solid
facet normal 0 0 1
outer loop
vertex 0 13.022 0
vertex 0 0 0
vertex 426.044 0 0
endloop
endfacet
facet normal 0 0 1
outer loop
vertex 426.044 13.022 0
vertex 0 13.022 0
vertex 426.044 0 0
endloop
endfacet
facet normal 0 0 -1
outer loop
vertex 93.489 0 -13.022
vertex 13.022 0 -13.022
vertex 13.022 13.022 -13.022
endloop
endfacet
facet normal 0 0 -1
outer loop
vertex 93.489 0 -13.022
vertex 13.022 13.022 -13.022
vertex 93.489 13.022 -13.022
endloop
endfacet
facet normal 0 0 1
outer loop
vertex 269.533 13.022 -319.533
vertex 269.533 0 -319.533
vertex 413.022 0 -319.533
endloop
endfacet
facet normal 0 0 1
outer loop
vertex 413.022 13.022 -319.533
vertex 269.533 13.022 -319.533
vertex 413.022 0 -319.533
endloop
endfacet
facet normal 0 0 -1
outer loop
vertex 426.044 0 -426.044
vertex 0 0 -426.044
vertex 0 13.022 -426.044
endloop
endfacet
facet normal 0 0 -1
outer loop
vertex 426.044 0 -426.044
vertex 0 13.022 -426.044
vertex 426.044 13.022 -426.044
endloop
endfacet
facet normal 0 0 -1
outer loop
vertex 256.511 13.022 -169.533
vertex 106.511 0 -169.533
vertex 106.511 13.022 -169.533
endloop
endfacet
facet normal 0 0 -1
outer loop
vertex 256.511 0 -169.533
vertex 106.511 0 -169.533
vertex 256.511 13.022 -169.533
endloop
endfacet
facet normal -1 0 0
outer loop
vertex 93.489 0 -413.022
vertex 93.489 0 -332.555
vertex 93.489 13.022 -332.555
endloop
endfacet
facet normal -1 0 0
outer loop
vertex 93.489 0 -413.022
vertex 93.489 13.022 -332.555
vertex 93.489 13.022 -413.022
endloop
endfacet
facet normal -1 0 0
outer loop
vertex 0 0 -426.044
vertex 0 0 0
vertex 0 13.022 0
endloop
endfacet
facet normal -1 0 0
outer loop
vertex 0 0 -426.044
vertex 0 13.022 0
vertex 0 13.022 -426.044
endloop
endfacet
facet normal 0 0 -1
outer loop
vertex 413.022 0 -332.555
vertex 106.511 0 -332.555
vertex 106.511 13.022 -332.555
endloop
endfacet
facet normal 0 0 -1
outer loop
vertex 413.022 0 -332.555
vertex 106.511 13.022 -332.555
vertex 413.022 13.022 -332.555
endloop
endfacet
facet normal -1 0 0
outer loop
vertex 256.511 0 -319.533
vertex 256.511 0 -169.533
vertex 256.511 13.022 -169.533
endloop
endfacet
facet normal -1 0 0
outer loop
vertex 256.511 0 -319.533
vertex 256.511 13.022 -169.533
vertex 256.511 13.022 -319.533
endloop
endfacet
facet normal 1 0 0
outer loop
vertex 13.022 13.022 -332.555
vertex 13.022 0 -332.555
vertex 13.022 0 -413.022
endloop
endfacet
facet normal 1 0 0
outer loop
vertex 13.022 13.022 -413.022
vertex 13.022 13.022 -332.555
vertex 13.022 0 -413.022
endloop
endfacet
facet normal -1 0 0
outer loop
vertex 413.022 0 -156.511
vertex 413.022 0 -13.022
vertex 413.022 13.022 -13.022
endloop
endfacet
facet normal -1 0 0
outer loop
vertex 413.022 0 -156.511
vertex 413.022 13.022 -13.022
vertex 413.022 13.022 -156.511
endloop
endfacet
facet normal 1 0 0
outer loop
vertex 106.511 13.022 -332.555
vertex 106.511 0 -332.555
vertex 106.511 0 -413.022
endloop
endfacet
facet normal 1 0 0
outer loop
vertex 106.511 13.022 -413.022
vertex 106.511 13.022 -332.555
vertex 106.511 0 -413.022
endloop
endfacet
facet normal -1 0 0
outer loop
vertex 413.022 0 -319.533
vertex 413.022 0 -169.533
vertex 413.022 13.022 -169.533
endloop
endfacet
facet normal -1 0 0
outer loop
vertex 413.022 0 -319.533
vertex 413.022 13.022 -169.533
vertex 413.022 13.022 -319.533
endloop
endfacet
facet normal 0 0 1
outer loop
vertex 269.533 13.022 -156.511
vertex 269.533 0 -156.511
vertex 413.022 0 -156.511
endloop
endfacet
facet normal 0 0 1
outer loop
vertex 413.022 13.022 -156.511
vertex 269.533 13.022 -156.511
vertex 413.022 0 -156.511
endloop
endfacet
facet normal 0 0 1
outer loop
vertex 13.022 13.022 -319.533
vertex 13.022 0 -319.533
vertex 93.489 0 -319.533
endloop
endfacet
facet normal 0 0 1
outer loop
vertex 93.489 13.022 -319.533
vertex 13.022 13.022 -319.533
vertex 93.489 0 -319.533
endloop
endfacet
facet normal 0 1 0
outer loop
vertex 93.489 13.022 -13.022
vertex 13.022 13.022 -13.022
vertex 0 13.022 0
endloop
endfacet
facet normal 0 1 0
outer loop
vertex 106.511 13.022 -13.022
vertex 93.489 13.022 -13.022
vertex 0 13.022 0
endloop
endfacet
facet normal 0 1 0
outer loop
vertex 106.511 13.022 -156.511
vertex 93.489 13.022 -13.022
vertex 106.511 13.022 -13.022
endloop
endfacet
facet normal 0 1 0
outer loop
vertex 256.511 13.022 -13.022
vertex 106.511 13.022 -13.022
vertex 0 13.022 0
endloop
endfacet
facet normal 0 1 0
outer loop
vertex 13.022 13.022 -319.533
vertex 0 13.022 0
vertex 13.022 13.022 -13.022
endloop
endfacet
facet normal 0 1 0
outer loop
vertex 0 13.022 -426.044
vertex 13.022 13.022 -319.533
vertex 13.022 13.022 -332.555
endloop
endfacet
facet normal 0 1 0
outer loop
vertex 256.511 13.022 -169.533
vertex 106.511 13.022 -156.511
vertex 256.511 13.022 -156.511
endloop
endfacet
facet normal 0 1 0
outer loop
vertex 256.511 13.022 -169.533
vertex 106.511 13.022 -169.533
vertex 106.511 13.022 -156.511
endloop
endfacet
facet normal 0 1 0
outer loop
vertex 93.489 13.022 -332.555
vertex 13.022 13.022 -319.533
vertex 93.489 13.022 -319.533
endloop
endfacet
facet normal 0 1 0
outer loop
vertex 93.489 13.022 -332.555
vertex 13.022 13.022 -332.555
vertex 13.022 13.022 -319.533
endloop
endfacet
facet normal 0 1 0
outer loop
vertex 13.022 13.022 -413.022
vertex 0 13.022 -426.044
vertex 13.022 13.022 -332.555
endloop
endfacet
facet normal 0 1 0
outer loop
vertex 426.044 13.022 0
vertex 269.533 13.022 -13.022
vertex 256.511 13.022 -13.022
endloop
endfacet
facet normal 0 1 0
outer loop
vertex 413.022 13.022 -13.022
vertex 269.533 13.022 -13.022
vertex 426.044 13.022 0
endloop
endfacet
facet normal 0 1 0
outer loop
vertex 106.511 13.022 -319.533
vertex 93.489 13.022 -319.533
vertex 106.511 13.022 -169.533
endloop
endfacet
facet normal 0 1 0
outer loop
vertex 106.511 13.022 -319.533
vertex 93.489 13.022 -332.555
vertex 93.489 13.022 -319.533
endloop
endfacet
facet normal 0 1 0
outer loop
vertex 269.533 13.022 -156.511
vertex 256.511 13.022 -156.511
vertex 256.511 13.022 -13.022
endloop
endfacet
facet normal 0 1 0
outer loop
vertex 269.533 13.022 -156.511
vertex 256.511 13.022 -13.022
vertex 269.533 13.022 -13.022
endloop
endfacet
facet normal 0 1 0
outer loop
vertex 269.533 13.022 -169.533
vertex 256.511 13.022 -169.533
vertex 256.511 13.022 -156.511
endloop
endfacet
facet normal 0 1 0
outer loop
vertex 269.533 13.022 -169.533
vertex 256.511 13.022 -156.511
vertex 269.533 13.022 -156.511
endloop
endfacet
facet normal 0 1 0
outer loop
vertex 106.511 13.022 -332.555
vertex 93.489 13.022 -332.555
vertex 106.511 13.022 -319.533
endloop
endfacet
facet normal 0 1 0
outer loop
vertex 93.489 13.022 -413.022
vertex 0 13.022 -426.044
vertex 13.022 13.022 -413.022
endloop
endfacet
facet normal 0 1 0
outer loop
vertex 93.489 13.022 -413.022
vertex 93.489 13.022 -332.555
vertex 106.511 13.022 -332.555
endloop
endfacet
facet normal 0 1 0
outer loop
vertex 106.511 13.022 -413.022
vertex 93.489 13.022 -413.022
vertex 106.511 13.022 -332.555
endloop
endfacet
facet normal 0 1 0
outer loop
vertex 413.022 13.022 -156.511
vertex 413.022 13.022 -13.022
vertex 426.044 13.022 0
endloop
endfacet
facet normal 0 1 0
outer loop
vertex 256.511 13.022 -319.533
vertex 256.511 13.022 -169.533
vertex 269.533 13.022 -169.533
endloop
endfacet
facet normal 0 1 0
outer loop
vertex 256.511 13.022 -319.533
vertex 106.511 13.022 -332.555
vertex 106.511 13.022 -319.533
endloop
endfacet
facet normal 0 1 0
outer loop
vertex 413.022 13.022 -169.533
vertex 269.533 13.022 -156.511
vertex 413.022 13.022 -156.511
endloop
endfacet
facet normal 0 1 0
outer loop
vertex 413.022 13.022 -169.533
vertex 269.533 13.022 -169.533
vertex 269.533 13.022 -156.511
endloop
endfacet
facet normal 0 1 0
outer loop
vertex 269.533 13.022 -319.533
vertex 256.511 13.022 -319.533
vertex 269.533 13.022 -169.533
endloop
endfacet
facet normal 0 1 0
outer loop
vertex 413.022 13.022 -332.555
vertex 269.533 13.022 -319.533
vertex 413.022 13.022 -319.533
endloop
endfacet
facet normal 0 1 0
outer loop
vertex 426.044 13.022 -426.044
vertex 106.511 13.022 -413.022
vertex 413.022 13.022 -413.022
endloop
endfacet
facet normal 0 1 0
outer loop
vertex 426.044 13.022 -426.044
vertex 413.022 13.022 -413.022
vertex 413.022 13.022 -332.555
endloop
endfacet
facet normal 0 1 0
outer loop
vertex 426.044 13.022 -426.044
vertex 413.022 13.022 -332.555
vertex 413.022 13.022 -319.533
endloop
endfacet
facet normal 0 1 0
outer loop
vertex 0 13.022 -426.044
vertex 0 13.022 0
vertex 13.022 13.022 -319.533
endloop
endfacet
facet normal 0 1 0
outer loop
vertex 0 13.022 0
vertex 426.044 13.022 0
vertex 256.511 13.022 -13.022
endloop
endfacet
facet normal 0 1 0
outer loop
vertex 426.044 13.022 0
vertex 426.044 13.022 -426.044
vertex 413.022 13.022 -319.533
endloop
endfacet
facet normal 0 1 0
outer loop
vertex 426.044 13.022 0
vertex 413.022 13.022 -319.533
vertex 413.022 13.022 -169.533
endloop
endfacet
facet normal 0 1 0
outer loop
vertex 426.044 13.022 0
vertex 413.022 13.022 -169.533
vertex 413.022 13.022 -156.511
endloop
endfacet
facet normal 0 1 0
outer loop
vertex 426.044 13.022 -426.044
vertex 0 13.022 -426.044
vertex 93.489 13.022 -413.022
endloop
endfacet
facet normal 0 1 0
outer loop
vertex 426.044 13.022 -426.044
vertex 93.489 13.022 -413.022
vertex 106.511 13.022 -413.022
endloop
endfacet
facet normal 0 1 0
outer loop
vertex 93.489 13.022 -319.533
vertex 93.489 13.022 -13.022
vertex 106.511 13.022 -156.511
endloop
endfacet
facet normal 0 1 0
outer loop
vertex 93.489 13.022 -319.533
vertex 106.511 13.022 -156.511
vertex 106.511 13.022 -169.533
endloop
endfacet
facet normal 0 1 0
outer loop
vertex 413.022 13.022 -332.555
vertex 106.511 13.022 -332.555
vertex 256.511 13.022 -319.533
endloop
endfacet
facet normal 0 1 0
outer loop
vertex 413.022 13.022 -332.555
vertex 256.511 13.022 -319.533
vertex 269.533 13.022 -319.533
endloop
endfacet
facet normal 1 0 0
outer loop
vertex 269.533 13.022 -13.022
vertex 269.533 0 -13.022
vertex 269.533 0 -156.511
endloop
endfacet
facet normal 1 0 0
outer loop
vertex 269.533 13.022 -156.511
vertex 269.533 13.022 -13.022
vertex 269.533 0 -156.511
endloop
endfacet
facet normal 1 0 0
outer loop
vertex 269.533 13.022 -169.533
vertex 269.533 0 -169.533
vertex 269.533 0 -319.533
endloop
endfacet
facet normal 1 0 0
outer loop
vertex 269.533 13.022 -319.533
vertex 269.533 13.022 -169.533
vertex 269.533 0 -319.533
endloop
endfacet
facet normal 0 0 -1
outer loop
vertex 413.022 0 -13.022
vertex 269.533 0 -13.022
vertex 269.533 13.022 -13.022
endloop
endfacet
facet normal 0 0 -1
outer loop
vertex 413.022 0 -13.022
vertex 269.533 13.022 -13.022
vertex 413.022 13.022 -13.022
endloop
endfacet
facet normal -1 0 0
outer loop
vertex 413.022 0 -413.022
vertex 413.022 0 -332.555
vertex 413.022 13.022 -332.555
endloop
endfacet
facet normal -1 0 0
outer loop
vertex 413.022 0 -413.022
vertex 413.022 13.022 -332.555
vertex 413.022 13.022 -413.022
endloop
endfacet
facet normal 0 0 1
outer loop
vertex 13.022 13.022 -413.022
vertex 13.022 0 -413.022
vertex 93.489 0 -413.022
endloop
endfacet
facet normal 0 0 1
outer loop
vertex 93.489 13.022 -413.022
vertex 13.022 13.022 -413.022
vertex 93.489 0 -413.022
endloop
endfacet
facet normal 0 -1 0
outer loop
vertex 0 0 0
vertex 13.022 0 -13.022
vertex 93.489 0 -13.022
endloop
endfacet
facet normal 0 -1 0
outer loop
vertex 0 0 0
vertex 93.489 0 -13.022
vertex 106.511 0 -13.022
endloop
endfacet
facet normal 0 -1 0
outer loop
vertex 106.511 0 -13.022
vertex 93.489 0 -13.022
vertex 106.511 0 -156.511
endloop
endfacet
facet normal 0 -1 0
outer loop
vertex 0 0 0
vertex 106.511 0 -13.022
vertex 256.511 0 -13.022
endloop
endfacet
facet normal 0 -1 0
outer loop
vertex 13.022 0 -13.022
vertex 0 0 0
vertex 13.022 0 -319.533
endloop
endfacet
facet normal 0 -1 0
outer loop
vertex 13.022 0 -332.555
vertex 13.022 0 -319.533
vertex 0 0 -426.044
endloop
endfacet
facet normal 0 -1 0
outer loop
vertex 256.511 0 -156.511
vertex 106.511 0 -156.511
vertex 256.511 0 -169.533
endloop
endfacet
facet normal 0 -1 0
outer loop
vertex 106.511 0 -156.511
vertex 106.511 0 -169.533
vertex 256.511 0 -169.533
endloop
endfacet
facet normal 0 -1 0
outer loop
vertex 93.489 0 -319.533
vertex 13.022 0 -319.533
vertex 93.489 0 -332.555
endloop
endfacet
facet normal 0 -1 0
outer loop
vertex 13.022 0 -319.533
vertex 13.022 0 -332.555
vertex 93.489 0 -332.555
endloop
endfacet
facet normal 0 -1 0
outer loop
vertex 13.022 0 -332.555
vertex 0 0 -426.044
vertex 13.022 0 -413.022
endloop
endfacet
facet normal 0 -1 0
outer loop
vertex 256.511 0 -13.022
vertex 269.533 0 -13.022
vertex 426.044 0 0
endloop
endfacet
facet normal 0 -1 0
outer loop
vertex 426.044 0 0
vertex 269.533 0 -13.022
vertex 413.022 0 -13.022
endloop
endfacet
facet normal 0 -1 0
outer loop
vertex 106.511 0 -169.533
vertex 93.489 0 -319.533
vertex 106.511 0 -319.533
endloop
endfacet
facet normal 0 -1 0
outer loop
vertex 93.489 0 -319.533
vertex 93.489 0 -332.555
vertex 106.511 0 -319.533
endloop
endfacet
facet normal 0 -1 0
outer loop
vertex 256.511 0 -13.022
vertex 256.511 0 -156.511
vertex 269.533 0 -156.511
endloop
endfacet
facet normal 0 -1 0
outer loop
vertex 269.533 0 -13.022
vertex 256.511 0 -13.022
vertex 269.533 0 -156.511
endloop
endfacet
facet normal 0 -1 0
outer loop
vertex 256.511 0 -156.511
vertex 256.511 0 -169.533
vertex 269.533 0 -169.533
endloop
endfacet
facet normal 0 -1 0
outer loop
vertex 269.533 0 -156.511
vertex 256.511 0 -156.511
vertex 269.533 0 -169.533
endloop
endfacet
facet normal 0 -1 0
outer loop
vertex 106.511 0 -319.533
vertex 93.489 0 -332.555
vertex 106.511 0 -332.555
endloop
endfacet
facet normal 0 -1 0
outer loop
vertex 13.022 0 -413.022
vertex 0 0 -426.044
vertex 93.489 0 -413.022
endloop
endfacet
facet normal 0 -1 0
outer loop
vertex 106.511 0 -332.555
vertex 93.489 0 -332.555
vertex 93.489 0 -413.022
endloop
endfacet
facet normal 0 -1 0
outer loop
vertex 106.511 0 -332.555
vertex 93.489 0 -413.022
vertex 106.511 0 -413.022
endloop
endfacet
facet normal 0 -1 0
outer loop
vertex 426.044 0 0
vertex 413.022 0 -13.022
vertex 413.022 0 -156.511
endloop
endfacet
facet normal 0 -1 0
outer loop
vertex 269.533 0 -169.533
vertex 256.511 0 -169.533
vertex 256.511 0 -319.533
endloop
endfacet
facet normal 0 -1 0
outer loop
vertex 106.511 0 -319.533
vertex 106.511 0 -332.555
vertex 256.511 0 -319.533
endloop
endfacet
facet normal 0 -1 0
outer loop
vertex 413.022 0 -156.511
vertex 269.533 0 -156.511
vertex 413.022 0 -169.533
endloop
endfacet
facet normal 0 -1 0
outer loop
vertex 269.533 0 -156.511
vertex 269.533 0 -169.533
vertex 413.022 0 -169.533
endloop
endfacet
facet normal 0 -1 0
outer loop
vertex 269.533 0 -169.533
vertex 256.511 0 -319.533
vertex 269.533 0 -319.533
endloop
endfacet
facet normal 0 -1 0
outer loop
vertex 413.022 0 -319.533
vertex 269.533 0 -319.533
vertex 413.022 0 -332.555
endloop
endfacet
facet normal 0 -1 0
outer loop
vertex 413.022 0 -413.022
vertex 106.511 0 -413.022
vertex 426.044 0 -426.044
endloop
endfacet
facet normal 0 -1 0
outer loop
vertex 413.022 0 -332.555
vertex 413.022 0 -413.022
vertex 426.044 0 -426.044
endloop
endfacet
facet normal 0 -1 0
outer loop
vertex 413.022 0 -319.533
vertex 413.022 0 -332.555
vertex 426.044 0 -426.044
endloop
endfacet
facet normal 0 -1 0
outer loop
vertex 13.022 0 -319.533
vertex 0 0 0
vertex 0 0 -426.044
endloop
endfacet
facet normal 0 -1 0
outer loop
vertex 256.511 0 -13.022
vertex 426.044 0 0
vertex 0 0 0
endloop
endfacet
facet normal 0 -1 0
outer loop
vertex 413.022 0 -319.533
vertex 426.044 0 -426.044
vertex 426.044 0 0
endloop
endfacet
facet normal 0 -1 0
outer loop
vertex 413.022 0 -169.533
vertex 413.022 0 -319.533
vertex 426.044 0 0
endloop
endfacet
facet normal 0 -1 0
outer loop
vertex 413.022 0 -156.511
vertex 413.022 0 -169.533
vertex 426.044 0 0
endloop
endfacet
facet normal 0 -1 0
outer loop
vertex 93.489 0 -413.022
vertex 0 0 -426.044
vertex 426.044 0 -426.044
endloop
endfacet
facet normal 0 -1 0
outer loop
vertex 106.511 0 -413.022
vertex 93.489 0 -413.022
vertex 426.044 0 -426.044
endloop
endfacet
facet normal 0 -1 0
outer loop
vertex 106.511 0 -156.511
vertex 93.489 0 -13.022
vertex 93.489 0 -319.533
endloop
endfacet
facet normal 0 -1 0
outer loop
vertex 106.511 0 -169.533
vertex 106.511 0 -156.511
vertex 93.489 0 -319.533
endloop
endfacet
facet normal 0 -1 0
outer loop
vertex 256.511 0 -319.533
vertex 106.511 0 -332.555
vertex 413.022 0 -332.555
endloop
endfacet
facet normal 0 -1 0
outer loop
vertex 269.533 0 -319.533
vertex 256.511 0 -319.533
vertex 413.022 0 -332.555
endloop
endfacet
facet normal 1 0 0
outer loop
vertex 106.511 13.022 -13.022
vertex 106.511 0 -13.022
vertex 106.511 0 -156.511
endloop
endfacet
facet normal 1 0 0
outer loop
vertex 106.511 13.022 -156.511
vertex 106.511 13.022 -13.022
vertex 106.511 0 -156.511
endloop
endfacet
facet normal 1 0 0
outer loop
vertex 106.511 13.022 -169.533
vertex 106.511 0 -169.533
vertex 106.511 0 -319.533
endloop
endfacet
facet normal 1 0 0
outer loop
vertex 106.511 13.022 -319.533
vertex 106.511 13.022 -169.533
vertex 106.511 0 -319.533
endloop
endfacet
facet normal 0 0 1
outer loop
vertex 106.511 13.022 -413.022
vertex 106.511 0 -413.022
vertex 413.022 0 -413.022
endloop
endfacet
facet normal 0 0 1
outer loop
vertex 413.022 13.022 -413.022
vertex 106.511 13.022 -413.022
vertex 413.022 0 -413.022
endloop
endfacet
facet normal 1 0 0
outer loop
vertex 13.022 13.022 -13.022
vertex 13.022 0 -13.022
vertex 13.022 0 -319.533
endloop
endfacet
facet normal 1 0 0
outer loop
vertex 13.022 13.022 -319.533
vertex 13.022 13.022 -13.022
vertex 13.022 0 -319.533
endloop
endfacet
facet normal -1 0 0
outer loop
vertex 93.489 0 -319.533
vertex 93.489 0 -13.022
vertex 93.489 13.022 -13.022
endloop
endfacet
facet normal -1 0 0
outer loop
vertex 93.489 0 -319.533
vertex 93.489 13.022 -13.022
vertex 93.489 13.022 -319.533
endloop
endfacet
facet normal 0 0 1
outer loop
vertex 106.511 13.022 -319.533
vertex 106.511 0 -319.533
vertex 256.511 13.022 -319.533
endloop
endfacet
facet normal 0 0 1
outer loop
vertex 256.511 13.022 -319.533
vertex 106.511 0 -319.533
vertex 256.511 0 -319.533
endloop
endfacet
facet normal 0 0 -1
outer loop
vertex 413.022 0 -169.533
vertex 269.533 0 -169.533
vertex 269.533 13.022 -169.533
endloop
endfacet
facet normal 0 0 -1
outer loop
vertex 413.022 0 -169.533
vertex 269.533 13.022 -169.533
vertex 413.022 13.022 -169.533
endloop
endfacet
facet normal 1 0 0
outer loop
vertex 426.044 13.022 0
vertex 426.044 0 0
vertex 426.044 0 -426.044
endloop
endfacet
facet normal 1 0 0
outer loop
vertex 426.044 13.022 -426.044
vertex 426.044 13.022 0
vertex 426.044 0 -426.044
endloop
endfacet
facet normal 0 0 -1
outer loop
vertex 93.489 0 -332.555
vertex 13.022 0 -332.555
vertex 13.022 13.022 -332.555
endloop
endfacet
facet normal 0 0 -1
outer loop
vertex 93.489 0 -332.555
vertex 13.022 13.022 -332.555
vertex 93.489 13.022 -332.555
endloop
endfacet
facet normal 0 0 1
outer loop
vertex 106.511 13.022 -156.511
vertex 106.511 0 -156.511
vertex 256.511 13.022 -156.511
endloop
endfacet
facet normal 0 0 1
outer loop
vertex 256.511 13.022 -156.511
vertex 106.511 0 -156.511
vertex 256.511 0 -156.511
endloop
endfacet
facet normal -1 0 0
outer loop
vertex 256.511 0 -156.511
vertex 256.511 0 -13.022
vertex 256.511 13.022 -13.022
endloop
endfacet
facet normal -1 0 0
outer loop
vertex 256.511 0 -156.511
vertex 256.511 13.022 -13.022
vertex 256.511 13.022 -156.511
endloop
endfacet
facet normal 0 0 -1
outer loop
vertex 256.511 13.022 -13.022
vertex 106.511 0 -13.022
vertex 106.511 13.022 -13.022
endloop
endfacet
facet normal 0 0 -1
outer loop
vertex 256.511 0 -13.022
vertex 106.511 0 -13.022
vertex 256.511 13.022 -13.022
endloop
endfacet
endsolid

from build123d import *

# Parameters (mm, degrees)
SKETCH2_W           = 426.044
SKETCH2_H           = 426.044
SKETCH2_W_2         = 80.467
SKETCH2_H_2         = 306.511
SKETCH2_H_3         = 80.467
SKETCH2_W_3         = 143.489
SKETCH2_H_4         = 143.489
SKETCH2_W_4         = 306.511
SKETCH2_W_5         = 150
SKETCH2_H_5         = 150
BOSS_EXTRUDE1_DEPTH = 13.022


with BuildPart() as part:
    # Sketch2 → Boss-Extrude1 (new body)
    with BuildSketch(Plane(origin=(0, 0, 0), x_dir=(1, 0, 0), z_dir=(0, 1, 0))):
        with Locations((213.022, 213.022)):
            Rectangle(SKETCH2_W, SKETCH2_H)
        with Locations((53.2555, 166.2775)):
            Rectangle(SKETCH2_W_2, SKETCH2_H_2, mode=Mode.SUBTRACT)
        with Locations((53.2555, 372.7885)):
            Rectangle(SKETCH2_W_2, SKETCH2_H_3, mode=Mode.SUBTRACT)
        with Locations((341.2775, 84.7665)):
            Rectangle(SKETCH2_W_3, SKETCH2_H_4, mode=Mode.SUBTRACT)
        with Locations((259.7665, 372.7885)):
            Rectangle(SKETCH2_W_4, SKETCH2_H_3, mode=Mode.SUBTRACT)
        with Locations((181.511, 84.7665)):
            Rectangle(SKETCH2_W_5, SKETCH2_H_4, mode=Mode.SUBTRACT)
        with Locations((181.511, 244.533)):
            Rectangle(SKETCH2_W_5, SKETCH2_H_5, mode=Mode.SUBTRACT)
        with Locations((341.2775, 244.533)):
            Rectangle(SKETCH2_W_3, SKETCH2_H_5, mode=Mode.SUBTRACT)
    extrude(amount=BOSS_EXTRUDE1_DEPTH)


solid = part.part
